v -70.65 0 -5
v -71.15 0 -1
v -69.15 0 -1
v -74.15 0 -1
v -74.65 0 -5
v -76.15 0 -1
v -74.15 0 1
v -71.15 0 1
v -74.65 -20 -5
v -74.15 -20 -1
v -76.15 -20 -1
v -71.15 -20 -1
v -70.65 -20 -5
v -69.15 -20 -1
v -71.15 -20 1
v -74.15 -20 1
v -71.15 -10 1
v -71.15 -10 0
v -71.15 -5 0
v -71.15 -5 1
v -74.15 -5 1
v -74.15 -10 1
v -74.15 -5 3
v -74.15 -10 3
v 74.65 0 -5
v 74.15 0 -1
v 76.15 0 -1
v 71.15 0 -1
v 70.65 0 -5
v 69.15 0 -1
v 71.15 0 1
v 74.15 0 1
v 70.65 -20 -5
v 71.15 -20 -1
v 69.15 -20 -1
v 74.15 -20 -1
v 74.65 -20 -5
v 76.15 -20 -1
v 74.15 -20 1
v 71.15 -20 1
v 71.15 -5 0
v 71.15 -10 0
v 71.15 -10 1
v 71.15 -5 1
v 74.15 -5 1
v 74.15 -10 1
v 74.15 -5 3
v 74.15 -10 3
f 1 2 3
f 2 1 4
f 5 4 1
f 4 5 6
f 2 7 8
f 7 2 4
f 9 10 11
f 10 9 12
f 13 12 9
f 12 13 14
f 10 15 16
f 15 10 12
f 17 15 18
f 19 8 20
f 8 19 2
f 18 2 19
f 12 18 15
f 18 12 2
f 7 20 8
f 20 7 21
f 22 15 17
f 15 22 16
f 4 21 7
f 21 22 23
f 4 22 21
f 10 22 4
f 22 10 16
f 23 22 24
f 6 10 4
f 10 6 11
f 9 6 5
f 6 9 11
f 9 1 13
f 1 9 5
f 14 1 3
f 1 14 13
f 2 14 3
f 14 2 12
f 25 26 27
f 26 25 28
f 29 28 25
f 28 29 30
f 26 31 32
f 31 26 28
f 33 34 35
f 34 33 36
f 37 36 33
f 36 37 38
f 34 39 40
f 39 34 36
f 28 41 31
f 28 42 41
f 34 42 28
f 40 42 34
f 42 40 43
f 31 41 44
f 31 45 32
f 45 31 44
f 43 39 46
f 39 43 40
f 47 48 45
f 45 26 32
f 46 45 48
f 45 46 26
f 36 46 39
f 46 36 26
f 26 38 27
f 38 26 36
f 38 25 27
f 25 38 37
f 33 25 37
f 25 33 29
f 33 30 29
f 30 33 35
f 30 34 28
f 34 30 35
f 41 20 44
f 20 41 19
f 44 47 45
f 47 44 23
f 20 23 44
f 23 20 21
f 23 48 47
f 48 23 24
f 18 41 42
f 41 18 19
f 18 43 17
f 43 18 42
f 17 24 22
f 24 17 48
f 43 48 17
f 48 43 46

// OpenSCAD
// 141.06 mm separation
sep = 142.3;
length = 20;


//difference() {
rotate([0,0,90])
  union() {
    for (s = [0:1])
    mirror([0,s*1,0])
    translate([0,sep/2-2,-1])
    rotate([0,-90,0])
    linear_extrude(length)
    polygon([
      [0,0],[0,2],[2,2],[2,5],[0,5],[0,7],[-4,5.5],[-4,1.5],[0,0]
    ]);
    
    translate([-10,-(sep+6)/2,0])
    cube([5,sep+6,3]);
  }
//}
